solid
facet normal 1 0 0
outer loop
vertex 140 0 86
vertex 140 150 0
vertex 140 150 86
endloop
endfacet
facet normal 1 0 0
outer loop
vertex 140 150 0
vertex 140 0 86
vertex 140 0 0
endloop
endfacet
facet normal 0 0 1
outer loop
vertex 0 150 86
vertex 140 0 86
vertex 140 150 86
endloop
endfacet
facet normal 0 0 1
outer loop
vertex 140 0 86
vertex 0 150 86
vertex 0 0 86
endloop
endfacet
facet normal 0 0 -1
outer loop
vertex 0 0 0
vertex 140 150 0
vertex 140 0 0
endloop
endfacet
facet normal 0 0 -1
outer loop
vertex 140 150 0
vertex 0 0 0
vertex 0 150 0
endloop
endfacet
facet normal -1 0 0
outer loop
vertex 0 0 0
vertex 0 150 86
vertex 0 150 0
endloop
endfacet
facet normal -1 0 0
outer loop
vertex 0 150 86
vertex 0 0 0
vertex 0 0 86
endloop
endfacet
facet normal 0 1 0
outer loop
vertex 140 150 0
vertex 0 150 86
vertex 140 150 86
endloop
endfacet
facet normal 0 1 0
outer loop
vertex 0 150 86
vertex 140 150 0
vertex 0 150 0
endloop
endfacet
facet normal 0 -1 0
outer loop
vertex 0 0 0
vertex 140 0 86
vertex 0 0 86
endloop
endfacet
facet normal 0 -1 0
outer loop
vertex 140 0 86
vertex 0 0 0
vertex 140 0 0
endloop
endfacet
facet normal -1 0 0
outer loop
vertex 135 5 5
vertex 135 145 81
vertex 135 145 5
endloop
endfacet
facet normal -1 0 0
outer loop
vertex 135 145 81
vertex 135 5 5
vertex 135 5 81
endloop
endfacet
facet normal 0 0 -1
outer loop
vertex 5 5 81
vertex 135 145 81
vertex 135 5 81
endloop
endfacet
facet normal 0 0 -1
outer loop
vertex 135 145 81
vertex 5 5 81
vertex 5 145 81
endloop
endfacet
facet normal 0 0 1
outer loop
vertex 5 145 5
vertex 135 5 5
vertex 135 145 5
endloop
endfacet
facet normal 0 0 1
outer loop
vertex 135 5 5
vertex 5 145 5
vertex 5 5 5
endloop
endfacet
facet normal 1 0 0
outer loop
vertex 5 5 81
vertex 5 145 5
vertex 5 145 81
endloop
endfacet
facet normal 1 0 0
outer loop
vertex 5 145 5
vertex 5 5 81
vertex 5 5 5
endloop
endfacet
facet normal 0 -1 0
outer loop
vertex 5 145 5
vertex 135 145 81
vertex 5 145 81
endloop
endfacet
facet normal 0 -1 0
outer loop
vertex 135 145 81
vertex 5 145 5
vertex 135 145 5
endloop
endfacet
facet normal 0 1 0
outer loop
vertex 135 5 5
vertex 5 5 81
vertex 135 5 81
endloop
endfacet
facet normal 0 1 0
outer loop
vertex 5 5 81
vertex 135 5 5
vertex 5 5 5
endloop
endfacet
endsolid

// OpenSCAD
module psu_body()
{ 
	cube([140,150,86.0]);


}

module psu_cuts()
{
   translate([5,5,5]) cube([130,140,76]);


}


module psu()
{

	difference(){
          psu_body();
          psu_cuts();
          }

}


psu();
